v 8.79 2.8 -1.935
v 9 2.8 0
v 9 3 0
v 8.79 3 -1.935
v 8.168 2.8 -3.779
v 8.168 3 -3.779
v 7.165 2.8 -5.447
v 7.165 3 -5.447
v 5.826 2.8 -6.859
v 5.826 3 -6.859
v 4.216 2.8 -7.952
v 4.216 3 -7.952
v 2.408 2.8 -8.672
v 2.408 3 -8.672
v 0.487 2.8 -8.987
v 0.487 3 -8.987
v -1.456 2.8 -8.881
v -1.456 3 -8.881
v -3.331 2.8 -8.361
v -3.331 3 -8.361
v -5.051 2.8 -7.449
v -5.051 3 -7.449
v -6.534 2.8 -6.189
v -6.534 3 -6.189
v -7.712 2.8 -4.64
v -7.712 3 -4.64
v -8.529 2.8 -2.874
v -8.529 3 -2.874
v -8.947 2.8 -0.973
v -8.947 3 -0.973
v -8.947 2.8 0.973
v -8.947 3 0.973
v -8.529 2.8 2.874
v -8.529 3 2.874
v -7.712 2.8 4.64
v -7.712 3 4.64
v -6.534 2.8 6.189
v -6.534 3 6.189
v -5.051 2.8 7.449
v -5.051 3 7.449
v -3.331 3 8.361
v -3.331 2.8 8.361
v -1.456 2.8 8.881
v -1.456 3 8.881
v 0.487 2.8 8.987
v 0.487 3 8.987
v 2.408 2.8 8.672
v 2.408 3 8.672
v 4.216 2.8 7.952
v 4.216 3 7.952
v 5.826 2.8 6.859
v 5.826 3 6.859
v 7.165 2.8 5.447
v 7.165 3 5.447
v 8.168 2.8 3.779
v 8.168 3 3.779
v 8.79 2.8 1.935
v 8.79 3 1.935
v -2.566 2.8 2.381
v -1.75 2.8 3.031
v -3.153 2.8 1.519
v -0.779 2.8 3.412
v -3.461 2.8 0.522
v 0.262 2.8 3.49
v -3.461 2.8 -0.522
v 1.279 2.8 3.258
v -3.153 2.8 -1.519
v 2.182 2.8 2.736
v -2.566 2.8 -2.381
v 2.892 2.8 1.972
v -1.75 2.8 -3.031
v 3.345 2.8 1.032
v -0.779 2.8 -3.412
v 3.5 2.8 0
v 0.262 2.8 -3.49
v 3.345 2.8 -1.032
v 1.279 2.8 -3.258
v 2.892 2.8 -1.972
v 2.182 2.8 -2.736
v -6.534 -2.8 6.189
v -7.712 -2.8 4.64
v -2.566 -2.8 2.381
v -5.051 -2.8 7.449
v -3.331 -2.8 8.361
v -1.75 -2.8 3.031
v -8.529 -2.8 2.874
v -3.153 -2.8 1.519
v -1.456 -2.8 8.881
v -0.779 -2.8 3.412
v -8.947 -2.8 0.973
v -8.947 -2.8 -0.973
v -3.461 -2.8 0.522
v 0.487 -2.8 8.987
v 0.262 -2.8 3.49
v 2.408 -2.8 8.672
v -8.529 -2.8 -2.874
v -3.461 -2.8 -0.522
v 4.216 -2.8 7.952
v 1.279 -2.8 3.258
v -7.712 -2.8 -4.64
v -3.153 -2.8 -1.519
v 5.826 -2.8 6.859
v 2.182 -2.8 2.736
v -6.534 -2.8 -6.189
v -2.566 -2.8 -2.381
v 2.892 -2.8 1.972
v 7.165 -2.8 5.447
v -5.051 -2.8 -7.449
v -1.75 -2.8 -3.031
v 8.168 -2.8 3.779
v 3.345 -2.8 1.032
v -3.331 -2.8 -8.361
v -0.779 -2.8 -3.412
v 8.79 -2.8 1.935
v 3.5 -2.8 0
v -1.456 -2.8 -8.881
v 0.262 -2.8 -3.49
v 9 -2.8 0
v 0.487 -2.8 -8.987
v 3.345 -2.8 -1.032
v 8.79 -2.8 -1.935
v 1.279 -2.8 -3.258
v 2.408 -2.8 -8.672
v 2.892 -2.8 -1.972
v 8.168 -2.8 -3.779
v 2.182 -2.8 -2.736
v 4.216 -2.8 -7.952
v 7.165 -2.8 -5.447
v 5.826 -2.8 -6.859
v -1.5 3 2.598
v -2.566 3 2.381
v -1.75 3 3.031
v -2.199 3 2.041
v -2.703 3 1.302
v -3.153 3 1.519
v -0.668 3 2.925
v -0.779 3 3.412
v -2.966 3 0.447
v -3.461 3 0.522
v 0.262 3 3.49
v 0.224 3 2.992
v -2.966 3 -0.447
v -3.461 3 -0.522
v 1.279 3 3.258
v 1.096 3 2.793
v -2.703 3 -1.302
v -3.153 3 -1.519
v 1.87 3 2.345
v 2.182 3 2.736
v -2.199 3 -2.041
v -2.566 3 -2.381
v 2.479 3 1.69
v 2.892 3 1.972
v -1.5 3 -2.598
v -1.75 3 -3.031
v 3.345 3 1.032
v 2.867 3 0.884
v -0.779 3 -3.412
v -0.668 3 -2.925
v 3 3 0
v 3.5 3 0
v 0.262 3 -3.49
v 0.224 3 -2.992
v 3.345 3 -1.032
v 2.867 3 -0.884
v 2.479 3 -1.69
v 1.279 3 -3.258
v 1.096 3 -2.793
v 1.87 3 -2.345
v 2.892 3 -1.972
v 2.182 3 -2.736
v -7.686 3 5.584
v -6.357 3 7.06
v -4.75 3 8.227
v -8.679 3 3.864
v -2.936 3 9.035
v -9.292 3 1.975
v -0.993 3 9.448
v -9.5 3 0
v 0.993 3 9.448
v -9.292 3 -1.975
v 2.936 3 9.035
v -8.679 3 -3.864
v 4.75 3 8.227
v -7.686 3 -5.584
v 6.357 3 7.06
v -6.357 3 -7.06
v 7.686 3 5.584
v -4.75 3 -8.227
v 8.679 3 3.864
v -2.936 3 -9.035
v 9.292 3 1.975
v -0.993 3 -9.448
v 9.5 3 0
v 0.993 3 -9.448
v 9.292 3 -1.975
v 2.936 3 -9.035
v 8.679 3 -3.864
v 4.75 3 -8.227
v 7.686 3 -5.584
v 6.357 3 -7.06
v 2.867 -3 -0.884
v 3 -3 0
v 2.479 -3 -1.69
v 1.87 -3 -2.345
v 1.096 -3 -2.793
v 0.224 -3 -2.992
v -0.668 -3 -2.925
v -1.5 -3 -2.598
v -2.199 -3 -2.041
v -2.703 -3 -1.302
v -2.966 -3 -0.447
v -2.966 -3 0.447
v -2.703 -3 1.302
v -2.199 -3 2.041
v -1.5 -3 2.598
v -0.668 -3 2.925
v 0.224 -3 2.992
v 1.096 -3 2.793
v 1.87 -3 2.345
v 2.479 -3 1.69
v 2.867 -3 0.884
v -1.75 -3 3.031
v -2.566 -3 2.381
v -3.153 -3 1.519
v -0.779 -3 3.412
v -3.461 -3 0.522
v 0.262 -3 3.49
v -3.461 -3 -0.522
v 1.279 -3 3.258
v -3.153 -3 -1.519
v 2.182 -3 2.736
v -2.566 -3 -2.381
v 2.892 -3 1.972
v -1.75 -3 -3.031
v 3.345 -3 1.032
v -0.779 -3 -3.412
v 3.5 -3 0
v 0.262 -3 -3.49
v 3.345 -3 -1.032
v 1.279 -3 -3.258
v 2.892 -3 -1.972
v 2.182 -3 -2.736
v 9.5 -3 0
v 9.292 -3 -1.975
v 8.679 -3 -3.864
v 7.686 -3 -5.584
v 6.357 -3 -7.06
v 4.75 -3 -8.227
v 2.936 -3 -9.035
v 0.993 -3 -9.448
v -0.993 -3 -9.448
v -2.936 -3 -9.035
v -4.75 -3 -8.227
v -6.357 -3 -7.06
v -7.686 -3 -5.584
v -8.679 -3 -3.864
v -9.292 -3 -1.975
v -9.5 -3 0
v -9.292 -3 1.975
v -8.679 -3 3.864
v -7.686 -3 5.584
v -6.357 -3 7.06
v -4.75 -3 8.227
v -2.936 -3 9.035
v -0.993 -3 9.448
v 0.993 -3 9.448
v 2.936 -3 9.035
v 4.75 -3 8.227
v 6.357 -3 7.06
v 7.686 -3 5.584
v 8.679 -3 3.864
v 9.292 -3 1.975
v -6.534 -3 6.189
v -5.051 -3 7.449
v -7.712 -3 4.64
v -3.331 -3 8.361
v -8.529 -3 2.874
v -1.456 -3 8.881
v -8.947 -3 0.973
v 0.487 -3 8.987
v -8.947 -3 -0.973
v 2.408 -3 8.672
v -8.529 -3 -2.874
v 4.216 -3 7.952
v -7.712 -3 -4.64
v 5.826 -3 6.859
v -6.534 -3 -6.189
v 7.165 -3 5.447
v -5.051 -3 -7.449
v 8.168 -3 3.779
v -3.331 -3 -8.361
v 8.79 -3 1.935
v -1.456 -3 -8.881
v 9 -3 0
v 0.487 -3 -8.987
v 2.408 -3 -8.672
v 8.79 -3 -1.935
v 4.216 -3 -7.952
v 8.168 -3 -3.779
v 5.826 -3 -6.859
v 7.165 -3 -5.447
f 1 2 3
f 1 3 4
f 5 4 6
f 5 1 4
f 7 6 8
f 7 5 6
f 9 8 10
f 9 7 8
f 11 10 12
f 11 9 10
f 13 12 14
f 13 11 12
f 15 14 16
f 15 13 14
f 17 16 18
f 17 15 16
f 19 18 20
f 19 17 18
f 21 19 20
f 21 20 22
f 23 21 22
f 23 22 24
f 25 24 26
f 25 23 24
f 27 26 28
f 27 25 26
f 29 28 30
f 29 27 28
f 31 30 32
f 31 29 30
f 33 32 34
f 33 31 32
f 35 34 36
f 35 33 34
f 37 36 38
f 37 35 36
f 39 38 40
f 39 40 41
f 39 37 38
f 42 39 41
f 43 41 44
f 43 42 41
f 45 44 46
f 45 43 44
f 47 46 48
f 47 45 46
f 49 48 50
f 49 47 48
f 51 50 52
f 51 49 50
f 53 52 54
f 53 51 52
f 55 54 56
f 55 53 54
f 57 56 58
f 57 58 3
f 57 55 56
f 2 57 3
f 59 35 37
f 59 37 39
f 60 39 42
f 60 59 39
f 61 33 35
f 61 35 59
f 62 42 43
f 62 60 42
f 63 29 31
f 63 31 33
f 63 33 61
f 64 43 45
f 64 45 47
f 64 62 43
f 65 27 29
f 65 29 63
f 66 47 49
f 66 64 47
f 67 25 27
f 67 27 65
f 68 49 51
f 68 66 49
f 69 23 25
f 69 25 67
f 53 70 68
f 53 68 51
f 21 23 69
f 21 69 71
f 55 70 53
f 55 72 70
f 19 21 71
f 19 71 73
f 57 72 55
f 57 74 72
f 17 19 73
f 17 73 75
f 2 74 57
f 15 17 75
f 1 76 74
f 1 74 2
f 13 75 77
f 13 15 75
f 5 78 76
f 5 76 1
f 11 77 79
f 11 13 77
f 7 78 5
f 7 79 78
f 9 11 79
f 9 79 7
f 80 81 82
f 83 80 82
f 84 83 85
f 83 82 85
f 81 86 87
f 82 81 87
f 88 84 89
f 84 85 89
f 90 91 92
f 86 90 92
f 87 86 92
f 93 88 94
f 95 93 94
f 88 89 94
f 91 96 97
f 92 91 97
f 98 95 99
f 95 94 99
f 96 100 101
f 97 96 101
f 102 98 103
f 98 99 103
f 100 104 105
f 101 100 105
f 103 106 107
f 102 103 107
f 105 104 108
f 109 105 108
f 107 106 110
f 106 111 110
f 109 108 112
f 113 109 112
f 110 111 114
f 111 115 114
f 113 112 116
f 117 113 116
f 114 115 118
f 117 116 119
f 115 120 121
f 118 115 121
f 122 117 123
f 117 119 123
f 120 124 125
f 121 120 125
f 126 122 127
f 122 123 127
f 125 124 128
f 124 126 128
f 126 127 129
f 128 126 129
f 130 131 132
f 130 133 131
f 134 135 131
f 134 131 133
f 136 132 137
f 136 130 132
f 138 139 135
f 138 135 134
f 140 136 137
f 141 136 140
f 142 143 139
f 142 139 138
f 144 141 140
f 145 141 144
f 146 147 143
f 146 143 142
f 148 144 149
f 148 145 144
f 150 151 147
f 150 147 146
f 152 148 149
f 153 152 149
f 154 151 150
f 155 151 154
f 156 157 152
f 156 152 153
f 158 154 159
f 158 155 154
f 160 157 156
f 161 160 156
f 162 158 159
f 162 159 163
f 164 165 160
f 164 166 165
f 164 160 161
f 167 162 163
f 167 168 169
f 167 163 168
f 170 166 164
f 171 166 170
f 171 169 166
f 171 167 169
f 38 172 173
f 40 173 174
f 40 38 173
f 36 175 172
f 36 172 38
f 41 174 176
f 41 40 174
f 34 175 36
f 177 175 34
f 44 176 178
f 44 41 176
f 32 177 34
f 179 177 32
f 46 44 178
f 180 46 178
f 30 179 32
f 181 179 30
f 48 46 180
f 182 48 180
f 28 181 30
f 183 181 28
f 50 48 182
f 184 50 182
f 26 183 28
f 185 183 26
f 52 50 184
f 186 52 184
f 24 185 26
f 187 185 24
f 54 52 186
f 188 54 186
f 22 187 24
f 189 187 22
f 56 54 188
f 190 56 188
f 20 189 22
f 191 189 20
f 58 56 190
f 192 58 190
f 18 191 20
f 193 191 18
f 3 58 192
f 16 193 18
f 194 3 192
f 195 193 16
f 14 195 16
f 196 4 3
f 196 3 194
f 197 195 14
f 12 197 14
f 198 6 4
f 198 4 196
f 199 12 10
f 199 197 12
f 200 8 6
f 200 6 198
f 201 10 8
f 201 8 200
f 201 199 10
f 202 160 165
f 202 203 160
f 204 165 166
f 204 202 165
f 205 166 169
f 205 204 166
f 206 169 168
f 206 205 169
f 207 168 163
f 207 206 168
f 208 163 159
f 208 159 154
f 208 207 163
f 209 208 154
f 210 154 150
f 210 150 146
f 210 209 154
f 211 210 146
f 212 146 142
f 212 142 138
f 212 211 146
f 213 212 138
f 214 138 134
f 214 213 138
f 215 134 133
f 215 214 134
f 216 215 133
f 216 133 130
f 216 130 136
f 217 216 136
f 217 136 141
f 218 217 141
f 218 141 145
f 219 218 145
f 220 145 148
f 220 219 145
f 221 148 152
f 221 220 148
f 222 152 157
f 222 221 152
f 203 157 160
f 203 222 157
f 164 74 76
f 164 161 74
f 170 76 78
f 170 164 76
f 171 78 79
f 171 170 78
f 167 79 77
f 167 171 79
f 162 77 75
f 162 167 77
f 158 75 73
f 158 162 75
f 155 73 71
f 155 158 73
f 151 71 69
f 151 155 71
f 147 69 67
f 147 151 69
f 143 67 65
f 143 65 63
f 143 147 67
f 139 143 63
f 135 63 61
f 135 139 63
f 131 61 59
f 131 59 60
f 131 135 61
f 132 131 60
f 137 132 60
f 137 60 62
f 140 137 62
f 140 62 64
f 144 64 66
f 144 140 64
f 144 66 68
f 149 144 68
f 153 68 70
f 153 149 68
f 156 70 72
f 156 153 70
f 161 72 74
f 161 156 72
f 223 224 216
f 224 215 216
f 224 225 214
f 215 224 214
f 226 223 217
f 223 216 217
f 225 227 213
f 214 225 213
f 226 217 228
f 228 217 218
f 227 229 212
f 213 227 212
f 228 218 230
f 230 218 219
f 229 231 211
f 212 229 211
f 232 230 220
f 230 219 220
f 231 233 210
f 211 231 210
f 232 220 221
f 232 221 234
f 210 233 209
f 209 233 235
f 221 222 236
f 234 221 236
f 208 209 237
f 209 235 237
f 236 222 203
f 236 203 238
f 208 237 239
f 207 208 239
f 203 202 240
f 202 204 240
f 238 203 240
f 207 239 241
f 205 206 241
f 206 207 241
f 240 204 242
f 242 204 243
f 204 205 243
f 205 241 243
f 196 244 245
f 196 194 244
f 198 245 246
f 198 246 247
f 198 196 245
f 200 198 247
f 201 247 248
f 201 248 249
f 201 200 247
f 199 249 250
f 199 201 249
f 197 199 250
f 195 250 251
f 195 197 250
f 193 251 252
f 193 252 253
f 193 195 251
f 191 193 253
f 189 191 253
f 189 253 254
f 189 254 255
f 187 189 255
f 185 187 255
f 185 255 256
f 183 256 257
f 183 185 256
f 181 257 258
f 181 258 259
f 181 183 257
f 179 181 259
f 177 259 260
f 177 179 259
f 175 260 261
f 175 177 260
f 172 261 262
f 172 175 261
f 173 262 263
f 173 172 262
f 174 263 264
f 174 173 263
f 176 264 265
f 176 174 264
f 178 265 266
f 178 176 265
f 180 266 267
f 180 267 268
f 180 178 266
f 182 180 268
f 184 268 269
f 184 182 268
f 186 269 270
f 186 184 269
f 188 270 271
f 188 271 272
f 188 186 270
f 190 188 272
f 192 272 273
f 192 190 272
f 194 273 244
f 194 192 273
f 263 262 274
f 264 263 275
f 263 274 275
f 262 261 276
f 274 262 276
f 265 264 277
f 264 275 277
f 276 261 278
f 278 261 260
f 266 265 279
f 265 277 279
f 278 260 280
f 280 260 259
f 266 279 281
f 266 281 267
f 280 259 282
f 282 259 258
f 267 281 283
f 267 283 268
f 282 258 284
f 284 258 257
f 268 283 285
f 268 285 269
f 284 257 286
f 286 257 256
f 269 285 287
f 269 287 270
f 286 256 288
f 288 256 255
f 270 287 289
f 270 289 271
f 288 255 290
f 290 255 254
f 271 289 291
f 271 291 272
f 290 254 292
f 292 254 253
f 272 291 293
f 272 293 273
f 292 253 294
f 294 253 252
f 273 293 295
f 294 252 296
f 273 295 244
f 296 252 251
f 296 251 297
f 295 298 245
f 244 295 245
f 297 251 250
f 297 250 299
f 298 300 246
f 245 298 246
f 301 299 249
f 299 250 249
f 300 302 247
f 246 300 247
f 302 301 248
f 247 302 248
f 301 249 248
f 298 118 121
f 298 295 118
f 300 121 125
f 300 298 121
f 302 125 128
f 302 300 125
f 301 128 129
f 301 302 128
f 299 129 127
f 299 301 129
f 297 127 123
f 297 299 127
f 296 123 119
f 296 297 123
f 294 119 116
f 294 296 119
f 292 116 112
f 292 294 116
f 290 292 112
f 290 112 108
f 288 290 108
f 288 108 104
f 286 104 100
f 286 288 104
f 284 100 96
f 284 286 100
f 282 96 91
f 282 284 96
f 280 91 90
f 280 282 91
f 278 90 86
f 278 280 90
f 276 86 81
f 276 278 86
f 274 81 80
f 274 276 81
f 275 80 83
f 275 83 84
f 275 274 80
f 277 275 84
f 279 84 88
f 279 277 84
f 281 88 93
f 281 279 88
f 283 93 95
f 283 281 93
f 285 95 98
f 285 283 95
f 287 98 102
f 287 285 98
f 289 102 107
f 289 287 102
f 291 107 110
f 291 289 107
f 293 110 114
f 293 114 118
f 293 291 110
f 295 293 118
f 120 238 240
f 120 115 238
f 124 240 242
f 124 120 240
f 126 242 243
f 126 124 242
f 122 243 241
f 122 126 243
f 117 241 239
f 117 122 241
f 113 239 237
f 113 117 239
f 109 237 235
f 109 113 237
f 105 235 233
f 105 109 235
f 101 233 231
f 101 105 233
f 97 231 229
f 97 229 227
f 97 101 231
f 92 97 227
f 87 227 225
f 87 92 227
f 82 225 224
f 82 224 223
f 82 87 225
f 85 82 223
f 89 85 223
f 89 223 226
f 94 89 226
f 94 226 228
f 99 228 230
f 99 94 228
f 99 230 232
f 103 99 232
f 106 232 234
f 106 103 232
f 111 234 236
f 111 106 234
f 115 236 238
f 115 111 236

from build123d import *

# Parameters (mm, degrees)
BOSS_EXTRU_1_DEPTH        = 3
BOSS_EXTRU_1_DEPTH_BACK   = 3
ESQUISSE1_R               = 3.5
ESQUISSE1_R_2             = 3
BOSS_EXTRU_1_2_DEPTH      = 3
BOSS_EXTRU_1_2_DEPTH_BACK = 3
ESQUISSE1_R_3             = 9.5
ESQUISSE1_R_4             = 9
BOSS_EXTRU_2_DEPTH        = 2.8
BOSS_EXTRU_2_DEPTH_BACK   = 2.8
ESQUISSE1_6_R             = 9
ESQUISSE1_6_R_2           = 3.5


with BuildPart() as part:
    # Esquisse1 → Boss.-Extru.1 (new, two sides: drawn at the far end of the back side and taken through both)
    with BuildSketch(Plane(origin=(0, 0, 0), x_dir=(1, 0, 0), z_dir=(0, 1, 0)).offset(-BOSS_EXTRU_1_DEPTH_BACK)):
        Circle(ESQUISSE1_R)
        Circle(ESQUISSE1_R_2, mode=Mode.SUBTRACT)
    extrude(amount=BOSS_EXTRU_1_DEPTH + BOSS_EXTRU_1_DEPTH_BACK)



with BuildPart() as body_2:
    # Esquisse1 → Boss.-Extru.1 2 (new, two sides: drawn at the far end of the back side and taken through both)
    with BuildSketch(Plane(origin=(0, 0, 0), x_dir=(1, 0, 0), z_dir=(0, 1, 0)).offset(-BOSS_EXTRU_1_2_DEPTH_BACK)):
        Circle(ESQUISSE1_R_3)
        Circle(ESQUISSE1_R_4, mode=Mode.SUBTRACT)
    extrude(amount=BOSS_EXTRU_1_2_DEPTH + BOSS_EXTRU_1_2_DEPTH_BACK)


with BuildPart() as part_1:
    add(part.part)

    add(body_2.part)  # Boss.-Extru.2 merges body 2
    # Esquisse1_6 → Boss.-Extru.2 (add, two sides: drawn at the far end of the back side and taken through both)
    with BuildSketch(Plane(origin=(0, 0, 0), x_dir=(1, 0, 0), z_dir=(0, 1, 0)).offset(-BOSS_EXTRU_2_DEPTH_BACK)):
        Circle(ESQUISSE1_6_R)
        Circle(ESQUISSE1_6_R_2, mode=Mode.SUBTRACT)
    extrude(amount=BOSS_EXTRU_2_DEPTH + BOSS_EXTRU_2_DEPTH_BACK)


solid = part_1.part
